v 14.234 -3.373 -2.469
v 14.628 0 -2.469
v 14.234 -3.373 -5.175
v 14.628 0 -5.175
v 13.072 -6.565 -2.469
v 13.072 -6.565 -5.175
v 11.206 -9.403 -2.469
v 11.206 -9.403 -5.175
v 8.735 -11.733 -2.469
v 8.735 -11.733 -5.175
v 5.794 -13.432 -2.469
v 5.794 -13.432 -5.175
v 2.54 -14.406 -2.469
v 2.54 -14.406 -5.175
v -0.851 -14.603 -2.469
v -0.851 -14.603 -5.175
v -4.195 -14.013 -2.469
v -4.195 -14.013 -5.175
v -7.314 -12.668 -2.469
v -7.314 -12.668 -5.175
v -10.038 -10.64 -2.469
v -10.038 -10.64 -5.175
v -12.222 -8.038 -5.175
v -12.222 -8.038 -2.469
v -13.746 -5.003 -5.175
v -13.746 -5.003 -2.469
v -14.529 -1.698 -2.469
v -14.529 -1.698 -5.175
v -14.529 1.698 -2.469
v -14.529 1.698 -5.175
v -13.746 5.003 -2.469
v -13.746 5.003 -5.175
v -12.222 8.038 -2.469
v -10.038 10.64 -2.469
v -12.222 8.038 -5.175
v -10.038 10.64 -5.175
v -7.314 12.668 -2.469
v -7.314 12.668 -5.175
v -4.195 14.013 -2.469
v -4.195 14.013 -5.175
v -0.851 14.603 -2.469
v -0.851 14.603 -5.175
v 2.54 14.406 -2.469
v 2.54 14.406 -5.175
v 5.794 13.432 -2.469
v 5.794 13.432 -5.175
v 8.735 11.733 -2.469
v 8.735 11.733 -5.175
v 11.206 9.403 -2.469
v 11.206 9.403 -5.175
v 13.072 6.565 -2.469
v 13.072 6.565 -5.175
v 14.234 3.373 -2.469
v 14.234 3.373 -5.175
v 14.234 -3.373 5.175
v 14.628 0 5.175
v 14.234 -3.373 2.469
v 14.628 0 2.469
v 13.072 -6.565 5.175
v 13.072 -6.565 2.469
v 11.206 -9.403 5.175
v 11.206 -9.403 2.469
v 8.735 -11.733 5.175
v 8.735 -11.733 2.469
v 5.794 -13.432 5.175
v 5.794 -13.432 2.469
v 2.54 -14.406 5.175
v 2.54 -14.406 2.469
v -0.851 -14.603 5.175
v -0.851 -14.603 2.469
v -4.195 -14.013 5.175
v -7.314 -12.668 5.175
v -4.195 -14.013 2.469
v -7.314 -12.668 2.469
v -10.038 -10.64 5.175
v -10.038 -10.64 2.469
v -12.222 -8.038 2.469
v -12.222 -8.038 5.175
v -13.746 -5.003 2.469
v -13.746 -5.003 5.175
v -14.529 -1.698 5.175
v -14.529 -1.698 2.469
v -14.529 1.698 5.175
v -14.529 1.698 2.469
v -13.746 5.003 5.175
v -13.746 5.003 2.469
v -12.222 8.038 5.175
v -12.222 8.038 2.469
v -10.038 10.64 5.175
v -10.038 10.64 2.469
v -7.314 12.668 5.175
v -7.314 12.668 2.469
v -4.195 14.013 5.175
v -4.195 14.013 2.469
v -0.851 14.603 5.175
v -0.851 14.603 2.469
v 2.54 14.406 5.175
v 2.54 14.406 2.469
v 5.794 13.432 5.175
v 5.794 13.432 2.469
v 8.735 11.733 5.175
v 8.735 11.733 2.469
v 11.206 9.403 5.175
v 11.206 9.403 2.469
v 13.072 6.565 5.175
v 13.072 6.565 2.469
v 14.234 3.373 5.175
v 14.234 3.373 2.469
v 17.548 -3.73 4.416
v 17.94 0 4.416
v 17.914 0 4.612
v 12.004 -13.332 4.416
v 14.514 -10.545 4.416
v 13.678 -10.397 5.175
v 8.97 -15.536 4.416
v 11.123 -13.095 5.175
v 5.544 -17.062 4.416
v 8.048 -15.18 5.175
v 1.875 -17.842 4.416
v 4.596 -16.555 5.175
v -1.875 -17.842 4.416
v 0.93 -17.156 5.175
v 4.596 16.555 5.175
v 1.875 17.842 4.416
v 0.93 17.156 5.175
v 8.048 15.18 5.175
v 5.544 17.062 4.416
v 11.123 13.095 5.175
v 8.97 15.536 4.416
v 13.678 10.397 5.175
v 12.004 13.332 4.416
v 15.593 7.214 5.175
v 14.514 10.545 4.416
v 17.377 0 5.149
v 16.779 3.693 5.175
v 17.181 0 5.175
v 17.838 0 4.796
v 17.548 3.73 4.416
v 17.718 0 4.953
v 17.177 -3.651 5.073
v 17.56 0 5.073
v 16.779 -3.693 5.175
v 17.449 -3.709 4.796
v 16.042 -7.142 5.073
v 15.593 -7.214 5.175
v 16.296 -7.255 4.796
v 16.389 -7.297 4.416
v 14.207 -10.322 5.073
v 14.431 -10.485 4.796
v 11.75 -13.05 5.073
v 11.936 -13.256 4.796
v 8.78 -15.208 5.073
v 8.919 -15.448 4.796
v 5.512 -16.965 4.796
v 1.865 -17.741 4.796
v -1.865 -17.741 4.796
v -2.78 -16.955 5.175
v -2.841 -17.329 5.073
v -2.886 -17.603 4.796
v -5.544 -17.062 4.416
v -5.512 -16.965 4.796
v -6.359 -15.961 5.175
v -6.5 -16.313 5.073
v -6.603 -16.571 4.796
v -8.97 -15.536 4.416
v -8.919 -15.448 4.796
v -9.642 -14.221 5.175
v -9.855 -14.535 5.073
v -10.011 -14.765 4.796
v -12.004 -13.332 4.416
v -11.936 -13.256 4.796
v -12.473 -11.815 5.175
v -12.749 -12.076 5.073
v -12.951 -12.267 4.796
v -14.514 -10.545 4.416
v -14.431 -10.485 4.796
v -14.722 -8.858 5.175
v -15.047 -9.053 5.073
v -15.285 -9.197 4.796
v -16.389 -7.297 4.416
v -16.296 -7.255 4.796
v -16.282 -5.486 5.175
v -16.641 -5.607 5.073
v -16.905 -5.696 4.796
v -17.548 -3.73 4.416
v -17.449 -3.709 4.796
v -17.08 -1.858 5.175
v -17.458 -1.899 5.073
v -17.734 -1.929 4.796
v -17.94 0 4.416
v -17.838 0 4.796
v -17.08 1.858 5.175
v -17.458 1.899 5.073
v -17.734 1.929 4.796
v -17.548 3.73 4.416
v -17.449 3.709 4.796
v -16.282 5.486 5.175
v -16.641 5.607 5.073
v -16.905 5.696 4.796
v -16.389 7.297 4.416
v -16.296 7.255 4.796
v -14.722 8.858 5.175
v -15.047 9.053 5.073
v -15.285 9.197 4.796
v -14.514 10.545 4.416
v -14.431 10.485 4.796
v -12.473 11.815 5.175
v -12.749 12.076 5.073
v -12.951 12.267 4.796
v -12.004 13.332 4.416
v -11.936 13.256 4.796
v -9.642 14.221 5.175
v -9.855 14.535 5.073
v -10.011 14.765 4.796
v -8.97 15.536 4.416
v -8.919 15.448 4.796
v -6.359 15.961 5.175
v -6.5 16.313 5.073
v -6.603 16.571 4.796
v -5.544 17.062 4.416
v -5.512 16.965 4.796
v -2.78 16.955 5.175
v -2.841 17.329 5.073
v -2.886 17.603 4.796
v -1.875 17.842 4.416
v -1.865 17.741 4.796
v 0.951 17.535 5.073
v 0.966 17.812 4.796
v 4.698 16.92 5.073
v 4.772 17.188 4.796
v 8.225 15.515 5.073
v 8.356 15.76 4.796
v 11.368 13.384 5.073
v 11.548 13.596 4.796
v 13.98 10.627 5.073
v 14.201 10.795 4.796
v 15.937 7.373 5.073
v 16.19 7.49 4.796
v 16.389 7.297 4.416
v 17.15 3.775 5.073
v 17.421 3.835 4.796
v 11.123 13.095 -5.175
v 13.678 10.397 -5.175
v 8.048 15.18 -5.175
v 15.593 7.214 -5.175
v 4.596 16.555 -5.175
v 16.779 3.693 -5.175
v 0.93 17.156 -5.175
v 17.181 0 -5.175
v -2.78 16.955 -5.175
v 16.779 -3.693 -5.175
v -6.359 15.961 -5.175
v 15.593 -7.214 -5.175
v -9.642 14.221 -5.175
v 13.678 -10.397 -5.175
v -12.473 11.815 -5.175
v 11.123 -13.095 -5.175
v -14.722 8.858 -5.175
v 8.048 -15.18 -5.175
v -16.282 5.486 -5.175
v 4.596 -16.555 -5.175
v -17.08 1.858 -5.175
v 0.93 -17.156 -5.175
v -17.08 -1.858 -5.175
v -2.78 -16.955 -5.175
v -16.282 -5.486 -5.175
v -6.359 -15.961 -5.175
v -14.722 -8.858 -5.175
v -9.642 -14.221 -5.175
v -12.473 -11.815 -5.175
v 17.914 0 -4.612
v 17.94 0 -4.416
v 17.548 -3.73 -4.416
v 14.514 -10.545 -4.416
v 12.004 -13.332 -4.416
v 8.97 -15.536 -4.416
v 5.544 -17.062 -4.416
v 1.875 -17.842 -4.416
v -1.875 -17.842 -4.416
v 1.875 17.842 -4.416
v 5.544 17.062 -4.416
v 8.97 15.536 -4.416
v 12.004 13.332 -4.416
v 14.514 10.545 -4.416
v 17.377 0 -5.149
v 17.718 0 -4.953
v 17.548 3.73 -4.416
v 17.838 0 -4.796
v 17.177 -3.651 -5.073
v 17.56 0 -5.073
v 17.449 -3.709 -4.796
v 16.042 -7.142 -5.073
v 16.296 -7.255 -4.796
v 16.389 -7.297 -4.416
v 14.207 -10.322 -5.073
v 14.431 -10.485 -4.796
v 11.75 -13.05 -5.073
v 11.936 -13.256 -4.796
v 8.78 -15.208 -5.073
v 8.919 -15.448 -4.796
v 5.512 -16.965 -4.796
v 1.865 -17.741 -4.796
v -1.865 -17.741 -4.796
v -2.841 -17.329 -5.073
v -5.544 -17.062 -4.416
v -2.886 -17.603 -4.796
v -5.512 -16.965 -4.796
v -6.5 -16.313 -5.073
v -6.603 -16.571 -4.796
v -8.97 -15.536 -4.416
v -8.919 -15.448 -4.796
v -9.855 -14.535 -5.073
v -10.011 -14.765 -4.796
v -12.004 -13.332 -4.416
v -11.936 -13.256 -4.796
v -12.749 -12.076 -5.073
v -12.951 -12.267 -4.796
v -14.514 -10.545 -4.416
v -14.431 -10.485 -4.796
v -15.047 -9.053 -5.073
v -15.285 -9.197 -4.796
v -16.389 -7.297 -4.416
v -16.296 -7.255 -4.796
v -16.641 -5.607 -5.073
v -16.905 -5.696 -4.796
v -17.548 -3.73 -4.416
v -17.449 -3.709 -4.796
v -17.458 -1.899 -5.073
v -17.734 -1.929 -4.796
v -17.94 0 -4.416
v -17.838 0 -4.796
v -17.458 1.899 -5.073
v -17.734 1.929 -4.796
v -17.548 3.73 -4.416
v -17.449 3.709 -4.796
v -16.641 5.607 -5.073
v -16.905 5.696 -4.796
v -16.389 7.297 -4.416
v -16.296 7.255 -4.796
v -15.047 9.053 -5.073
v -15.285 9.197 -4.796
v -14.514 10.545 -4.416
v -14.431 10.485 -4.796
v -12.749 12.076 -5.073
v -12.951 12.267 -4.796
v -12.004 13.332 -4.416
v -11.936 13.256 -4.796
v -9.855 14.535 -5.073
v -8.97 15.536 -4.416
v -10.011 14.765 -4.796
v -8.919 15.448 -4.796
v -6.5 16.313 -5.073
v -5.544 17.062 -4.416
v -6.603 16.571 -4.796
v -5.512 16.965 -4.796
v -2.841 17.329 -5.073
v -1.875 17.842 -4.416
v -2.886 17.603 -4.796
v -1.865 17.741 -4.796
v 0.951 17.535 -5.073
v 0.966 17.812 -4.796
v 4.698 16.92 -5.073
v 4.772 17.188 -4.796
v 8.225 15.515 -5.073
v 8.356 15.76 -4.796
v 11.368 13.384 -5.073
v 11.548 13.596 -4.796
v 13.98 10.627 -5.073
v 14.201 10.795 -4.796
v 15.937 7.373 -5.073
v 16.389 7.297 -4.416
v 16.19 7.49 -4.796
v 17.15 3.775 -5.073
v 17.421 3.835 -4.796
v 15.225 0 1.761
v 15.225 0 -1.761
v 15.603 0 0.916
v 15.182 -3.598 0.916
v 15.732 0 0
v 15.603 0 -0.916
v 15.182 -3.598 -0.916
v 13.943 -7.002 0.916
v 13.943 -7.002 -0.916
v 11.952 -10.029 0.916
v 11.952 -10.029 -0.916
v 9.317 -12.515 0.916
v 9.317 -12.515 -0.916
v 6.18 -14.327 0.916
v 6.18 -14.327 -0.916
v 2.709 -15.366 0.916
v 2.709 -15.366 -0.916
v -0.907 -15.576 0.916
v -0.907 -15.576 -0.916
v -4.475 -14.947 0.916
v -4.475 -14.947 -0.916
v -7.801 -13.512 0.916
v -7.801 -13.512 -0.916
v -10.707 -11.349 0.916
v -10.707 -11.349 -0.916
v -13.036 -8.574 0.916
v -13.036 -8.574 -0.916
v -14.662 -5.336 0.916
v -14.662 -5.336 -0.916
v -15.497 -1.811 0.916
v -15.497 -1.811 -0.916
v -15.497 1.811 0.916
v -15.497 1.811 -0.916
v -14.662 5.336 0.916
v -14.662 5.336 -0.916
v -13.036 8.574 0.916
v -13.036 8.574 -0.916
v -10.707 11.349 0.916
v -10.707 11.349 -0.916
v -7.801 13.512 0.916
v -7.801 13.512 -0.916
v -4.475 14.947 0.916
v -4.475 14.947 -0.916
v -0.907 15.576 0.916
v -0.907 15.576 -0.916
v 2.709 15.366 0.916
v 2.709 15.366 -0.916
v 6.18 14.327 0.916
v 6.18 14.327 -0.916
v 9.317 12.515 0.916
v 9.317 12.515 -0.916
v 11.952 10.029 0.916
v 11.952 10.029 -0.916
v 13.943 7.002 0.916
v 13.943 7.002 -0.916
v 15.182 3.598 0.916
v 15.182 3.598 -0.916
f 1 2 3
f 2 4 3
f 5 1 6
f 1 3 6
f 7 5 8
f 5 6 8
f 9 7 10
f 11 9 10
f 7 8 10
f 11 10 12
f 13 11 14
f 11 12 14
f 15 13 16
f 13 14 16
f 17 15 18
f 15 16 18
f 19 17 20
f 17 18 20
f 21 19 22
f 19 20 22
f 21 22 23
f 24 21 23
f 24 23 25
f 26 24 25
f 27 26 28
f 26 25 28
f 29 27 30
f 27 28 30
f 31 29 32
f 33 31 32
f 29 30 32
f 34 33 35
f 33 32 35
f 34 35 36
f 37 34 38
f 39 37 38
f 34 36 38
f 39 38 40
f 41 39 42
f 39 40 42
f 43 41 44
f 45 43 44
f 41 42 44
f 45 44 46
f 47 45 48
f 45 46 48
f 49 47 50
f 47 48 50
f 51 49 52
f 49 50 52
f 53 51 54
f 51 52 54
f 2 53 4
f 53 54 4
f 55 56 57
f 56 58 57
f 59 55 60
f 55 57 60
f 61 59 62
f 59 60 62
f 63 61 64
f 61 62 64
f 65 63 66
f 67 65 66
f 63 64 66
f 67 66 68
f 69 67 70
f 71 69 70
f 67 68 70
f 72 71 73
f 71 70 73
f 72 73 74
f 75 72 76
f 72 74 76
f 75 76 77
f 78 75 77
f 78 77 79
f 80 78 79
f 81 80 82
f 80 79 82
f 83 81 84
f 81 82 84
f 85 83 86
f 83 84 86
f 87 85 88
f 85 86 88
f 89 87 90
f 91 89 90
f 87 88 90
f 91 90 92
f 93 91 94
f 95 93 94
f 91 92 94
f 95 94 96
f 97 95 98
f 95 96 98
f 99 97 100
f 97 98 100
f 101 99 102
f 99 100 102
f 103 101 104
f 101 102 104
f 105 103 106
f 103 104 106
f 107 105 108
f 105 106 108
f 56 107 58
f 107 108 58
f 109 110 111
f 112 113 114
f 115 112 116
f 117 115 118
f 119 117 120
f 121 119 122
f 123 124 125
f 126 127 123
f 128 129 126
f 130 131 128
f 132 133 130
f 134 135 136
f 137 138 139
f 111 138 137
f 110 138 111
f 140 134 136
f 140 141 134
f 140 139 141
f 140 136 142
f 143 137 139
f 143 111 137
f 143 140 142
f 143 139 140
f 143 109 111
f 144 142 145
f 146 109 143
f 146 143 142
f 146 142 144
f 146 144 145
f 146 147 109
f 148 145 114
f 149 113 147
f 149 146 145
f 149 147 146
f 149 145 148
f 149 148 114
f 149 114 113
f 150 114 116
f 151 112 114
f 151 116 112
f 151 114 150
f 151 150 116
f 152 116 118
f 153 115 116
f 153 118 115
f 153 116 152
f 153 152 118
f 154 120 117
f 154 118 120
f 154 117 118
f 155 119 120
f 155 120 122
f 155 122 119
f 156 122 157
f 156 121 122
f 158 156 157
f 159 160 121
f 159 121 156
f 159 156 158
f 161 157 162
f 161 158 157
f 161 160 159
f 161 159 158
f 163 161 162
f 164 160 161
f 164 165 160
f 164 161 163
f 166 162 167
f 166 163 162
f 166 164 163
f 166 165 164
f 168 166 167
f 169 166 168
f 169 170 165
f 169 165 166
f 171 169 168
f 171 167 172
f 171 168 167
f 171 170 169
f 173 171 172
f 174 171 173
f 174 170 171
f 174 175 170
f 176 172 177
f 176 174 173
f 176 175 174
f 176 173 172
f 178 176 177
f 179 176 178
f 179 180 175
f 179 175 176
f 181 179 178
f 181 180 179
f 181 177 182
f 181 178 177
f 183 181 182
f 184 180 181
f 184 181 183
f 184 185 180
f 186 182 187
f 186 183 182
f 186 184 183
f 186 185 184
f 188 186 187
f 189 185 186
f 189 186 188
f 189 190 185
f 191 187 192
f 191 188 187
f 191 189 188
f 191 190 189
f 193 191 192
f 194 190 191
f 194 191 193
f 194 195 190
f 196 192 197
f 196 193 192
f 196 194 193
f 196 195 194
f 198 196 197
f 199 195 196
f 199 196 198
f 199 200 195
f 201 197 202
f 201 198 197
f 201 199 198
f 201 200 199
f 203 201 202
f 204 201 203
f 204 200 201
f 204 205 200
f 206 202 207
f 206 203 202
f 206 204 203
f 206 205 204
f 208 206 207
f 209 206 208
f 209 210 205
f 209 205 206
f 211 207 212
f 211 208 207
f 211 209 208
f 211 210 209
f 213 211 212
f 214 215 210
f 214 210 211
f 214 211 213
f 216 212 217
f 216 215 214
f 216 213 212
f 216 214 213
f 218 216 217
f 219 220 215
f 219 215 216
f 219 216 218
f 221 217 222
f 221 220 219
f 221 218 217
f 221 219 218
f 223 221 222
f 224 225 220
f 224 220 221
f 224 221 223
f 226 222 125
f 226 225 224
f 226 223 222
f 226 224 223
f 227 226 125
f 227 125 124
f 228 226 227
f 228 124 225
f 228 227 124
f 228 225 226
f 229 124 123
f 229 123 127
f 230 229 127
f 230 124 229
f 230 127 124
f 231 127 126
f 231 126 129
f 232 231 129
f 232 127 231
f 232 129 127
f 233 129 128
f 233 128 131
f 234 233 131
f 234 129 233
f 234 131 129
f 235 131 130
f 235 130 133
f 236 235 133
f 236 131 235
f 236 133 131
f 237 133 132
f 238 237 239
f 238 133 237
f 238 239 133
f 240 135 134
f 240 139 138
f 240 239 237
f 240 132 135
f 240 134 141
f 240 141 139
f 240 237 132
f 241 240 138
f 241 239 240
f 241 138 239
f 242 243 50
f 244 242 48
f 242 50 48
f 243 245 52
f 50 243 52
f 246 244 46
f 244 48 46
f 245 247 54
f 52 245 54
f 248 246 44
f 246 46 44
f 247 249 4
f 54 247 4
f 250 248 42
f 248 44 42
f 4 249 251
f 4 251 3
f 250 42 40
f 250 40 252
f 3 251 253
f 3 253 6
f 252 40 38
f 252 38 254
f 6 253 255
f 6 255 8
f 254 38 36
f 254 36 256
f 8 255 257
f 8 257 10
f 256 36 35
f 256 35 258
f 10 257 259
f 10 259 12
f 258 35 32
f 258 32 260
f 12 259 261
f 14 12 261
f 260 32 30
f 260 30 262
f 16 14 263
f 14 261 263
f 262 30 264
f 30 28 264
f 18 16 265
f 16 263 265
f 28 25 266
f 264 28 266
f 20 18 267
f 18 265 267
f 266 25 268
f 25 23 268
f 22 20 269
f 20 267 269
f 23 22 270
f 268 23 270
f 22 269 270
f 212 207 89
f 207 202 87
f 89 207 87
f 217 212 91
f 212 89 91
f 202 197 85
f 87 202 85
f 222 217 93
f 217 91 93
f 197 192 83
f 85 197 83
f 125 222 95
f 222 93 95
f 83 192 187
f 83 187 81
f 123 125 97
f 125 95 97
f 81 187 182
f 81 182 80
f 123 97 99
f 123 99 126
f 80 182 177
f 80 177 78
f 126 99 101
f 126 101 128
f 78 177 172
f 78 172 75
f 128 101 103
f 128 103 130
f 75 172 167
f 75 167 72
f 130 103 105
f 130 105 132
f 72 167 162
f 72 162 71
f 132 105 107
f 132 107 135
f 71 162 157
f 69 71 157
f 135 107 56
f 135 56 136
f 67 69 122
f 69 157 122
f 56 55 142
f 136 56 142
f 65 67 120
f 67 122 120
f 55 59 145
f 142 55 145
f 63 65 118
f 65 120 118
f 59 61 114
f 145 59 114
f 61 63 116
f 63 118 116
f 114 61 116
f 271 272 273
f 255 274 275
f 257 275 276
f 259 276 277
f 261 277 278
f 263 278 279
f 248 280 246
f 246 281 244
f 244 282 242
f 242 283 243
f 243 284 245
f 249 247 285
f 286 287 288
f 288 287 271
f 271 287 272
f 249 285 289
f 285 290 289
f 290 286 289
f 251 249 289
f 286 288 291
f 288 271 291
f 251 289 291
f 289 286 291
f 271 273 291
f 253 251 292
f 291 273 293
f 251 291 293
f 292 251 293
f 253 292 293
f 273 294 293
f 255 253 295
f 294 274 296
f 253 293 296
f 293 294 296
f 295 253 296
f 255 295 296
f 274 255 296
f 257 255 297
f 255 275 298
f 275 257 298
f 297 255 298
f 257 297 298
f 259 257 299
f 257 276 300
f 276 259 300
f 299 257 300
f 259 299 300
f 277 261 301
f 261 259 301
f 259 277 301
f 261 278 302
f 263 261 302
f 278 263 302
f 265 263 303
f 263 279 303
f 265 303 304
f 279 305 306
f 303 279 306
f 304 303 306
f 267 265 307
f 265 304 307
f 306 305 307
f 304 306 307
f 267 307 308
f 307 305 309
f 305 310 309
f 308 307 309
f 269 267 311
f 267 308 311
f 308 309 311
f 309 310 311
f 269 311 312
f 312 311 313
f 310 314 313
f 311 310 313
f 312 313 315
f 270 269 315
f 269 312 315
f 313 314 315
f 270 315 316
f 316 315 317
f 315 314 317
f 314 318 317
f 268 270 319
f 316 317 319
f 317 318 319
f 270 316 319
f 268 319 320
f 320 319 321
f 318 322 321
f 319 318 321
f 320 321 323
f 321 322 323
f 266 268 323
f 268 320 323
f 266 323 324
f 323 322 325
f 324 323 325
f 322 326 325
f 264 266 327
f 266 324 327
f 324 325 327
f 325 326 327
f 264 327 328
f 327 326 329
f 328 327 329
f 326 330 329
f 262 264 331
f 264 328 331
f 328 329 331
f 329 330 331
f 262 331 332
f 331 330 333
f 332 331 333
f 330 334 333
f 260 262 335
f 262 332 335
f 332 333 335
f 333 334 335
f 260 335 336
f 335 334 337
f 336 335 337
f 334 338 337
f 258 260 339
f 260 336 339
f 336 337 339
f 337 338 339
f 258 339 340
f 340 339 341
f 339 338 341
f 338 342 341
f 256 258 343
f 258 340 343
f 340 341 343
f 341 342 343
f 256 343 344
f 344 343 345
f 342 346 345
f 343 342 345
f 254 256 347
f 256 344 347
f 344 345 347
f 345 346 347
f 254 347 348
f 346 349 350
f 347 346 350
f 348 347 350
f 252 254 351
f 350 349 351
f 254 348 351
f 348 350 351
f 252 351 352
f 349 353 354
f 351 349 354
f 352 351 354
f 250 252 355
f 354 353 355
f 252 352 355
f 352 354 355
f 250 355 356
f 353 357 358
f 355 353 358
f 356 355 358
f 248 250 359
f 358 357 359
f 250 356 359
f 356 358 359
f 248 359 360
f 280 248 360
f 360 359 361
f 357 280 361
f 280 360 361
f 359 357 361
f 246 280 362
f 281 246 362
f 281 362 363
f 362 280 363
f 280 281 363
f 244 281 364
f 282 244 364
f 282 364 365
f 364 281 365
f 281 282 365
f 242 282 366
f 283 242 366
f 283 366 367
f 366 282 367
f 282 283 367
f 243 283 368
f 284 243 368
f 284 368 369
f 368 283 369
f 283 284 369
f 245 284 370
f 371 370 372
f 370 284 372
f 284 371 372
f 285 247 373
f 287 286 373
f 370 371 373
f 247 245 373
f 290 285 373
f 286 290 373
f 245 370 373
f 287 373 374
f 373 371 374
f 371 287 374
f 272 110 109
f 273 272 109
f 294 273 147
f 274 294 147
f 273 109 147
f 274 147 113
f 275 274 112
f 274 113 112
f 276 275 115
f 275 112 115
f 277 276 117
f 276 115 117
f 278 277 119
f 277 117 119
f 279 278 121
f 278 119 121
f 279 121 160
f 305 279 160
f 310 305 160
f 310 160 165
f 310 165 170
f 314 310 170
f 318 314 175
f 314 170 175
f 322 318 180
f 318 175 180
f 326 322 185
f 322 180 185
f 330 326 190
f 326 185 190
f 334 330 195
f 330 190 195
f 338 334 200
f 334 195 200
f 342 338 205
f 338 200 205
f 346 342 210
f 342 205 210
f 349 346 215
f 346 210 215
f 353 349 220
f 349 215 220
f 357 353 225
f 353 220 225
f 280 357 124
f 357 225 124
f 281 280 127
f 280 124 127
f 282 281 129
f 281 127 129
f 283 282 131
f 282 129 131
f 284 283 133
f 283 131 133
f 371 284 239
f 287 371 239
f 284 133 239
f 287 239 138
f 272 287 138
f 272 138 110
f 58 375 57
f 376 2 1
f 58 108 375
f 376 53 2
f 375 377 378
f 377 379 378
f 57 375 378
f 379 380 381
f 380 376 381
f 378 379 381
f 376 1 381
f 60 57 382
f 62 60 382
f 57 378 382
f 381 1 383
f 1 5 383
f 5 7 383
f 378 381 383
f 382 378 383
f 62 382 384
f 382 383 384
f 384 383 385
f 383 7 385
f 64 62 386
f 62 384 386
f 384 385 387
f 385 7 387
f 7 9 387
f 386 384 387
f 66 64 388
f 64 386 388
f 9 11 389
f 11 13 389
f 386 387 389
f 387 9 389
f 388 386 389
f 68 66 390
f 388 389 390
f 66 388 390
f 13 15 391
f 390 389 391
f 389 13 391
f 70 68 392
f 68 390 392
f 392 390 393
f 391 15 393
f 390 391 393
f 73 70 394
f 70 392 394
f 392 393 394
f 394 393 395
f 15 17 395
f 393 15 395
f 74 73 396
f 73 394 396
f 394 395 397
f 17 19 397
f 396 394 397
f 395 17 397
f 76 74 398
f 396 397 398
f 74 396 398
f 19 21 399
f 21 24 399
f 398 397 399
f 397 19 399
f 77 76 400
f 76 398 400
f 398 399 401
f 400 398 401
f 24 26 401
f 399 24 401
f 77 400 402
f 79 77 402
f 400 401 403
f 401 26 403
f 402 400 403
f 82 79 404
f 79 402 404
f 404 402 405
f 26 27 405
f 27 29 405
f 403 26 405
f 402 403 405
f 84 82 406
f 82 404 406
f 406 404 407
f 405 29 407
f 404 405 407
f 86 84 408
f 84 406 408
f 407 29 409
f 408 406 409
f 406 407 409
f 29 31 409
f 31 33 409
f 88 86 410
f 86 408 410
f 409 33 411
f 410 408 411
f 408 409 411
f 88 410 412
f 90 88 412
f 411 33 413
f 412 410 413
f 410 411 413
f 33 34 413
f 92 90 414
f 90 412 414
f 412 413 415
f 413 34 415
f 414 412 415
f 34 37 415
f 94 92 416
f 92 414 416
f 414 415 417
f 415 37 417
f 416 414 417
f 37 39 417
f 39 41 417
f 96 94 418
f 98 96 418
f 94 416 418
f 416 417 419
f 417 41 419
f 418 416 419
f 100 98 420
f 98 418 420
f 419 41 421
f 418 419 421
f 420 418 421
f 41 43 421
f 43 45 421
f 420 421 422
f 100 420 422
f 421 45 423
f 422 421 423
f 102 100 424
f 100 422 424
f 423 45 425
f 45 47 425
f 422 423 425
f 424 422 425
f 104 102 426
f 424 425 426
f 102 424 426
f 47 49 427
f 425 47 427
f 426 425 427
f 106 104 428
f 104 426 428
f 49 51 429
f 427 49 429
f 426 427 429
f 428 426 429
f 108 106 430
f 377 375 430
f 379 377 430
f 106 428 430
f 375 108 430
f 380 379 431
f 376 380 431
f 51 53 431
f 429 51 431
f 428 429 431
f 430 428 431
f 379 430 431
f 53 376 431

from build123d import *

# Parameters (mm, degrees)
CONG_1_R       = 1.1
ECHELLE1_SCALE = 0.69


with BuildPart() as part:
    # Esquisse1 → Révolution1 (revolve)
    with BuildSketch(Plane(origin=(0, 0, 0), x_dir=(0, 0, -1), z_dir=(1, 0, 0)), mode=Mode.PRIVATE) as r_volution1_sk:
        with BuildLine():
            Line((-7.5, 26), (-7.5, 21.2))
            Line((-7.5, 21.2), (-3.577708764, 21.2))
            ThreePointArc((-3.577708764, 21.2), (0, 22.8), (3.577708764, 21.2))
            Line((3.577708764, 21.2), (7.5, 21.2))
            Line((7.5, 21.2), (7.5, 26))
            Line((7.5, 26), (-7.5, 26))
        make_face()
    revolve(r_volution1_sk.sketch.rotate(Axis((0, 0, 0), (0, 0, -1)), 90), axis=Axis((0, 0, 0), (0, 0, -1)))

    # Congé1
    cong_1_edges = [part.edges().sort_by_distance(p)[0] for p in [
        (-26, 0, 7.5),
        (-26, 0, -7.5),
    ]]
    fillet(cong_1_edges, radius=CONG_1_R)


with BuildPart() as part_1:
    # Echelle1: scaled about (0, 0, 0)
    add(part.part.scale(ECHELLE1_SCALE))


solid = part_1.part
